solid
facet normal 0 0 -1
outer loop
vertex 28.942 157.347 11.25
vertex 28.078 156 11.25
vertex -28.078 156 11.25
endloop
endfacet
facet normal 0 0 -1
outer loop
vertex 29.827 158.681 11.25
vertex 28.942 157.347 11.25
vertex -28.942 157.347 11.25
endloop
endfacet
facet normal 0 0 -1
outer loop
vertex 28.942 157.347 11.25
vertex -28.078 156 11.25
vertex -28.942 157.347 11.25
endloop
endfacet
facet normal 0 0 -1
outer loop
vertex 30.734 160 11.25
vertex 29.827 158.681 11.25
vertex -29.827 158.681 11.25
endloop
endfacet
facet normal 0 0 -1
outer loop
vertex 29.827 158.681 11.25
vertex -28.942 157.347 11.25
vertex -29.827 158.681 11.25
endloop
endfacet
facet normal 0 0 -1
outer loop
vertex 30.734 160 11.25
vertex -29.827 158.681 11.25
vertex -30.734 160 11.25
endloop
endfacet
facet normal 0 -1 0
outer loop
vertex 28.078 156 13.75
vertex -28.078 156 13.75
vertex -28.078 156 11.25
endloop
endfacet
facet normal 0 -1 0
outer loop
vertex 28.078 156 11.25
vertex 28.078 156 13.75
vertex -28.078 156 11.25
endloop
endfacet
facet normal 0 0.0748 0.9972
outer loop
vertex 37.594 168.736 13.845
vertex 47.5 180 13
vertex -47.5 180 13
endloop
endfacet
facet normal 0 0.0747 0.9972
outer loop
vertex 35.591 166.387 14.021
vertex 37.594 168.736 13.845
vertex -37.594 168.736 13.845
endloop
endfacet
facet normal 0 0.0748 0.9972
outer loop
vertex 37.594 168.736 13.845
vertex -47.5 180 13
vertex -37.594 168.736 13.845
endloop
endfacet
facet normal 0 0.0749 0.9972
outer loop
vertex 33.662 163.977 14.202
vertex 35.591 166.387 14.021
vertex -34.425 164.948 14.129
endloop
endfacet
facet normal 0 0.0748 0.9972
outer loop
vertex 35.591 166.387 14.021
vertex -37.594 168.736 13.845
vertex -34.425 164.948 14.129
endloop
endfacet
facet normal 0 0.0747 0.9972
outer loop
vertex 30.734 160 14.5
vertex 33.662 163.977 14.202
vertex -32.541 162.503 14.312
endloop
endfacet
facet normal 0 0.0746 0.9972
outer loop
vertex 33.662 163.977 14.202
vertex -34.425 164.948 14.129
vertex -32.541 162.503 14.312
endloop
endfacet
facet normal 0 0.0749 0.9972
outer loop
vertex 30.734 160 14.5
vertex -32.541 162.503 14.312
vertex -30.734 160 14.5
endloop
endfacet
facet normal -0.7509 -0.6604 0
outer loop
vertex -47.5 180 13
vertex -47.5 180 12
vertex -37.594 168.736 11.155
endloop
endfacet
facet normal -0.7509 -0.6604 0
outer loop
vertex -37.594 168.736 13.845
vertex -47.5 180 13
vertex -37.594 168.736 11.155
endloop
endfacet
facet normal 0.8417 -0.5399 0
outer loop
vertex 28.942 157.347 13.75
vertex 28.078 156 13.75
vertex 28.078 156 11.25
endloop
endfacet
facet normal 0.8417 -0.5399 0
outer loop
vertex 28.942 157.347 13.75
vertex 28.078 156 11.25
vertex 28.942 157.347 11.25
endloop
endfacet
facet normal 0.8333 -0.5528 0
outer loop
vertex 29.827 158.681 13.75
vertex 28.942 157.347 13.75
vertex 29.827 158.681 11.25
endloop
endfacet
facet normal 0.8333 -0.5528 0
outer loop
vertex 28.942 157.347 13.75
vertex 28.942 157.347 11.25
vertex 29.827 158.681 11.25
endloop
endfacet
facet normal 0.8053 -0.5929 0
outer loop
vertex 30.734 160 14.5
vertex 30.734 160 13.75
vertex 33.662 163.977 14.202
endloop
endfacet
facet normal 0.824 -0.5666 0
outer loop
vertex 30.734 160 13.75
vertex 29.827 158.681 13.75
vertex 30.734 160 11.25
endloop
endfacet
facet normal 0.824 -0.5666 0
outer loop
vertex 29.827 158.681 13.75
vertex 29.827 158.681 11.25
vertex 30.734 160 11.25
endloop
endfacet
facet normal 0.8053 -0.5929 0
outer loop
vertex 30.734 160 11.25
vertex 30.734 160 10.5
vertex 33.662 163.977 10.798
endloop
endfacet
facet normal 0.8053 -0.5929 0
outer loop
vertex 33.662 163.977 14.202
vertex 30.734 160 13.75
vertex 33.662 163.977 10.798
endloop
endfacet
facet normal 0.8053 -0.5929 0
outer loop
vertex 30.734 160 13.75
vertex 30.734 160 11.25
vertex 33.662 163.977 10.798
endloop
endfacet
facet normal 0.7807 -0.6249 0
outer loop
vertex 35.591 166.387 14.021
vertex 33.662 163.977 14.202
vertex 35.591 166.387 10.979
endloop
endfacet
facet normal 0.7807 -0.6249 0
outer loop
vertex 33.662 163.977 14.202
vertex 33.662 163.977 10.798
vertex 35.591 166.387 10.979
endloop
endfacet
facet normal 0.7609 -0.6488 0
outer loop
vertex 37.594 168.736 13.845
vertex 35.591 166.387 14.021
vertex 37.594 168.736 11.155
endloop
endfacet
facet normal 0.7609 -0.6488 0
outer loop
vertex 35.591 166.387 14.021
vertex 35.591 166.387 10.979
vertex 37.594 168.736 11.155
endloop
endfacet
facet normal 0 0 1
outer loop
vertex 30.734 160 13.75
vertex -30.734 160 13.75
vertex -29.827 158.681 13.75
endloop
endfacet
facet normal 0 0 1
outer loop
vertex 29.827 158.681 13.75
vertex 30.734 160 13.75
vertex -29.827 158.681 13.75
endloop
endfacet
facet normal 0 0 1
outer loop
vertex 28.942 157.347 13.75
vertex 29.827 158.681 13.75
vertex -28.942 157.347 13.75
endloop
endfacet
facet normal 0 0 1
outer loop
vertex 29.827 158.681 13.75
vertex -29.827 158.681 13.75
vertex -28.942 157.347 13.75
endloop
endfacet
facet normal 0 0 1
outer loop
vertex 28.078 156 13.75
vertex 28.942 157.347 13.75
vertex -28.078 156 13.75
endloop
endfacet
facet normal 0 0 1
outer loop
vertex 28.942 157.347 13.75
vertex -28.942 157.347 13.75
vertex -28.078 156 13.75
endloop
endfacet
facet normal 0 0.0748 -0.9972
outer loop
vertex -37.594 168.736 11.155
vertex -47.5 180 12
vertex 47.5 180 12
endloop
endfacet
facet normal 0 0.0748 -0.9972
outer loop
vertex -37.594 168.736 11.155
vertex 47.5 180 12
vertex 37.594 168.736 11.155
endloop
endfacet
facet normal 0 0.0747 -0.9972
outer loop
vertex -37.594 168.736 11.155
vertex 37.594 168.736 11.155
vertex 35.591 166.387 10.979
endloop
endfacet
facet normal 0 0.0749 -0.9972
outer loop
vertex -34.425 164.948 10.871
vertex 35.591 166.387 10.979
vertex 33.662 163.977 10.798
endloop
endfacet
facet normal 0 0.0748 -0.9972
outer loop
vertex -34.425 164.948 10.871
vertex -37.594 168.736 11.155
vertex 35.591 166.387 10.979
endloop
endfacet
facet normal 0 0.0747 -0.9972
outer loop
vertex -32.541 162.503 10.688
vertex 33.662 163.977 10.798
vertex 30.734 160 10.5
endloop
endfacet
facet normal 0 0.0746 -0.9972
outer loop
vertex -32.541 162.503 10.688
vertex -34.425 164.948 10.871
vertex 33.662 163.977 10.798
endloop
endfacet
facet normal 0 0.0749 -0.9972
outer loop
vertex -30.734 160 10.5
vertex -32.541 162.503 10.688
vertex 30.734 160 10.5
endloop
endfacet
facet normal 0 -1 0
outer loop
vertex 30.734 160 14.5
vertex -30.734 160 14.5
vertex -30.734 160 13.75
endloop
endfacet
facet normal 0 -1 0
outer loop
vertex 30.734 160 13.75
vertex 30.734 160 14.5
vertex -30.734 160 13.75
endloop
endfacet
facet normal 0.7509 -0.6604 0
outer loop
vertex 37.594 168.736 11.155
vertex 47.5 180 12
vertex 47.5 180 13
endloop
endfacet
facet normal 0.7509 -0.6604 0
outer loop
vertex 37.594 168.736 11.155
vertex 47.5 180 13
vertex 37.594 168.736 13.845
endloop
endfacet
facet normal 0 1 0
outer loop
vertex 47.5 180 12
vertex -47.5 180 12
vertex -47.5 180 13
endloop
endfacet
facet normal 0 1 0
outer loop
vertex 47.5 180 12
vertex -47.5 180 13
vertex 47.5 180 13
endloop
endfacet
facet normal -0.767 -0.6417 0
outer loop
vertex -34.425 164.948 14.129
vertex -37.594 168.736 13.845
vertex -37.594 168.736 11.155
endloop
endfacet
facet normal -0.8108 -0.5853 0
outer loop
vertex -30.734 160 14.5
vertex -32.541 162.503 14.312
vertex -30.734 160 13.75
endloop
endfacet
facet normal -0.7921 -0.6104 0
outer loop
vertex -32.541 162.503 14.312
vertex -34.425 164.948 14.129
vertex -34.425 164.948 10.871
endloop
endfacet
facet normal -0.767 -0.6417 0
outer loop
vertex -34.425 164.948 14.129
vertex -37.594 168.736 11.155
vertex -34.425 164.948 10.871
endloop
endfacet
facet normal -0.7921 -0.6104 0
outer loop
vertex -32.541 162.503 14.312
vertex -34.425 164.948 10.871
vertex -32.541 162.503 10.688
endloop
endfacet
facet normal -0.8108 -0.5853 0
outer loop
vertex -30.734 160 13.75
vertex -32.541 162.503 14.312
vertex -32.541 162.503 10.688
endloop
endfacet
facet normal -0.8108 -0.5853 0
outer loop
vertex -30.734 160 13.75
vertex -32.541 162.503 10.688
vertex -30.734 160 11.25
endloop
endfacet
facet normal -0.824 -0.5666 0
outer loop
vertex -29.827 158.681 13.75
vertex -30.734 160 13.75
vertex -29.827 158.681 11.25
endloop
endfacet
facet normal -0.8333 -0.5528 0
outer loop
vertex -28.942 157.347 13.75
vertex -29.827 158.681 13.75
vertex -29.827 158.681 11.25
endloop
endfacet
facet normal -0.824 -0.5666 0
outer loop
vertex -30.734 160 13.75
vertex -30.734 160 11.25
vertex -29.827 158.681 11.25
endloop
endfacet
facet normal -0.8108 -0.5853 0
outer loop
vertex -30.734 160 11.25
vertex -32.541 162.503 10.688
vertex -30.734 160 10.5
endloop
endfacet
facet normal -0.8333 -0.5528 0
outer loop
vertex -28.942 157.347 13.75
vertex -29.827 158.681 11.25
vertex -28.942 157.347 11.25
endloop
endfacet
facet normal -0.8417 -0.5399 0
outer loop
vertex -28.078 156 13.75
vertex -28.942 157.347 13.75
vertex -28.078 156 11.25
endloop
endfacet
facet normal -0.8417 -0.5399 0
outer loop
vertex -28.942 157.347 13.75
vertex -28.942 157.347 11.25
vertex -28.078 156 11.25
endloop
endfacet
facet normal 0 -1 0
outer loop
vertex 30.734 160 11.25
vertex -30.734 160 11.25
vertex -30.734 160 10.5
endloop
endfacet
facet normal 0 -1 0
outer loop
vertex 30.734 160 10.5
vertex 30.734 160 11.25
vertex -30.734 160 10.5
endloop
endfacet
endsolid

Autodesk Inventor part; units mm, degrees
ref_plane "YZ Plane" through (0, 0, 0) normal (1, 0, 0) x (0, 1, 0)
ref_plane "XZ Plane" through (0, 0, 0) normal (0, 1, 0) x (-1, 0, 0)
ref_plane "XY Plane" through (0, 0, 0) normal (0, 0, 1) x (1, 0, 0)
sketch "Эскиз1" plane through (0, 0, 0) normal (0, 0, 1) x (1, 0, 0)
  line L0 (-13, 0) -> (13, 0)
  line L1 (-47.5, 180) -> (47.5, 180)
  line L2 (-16.5, 130) -> (16.5, 130)
  line L3 (-12.9827, 110) -> (12.9827, 110)
  line L4 (-11.8003, 90) -> (11.8003, 90)
  line L5 (47.5, 180) -> (37.594, 168.7363)
  line L6 (-47.5, 180) -> (-37.594, 168.7363)
  line L7 (-37.594, 168.7363) -> (37.594, 168.7363)
  arc A0 (37.594, 168.7363) -> (12.9827, 110) centre (112.573, 102.7948) ccw
  arc A1 (12.9827, 110) -> (13, 0) centre (771.5375, 55.1194) ccw
  arc A2 (-12.9827, 110) -> (-37.594, 168.7363) centre (-112.573, 102.7948) ccw
  arc A3 (-13, 0) -> (-12.9827, 110) centre (-771.5375, 55.1194) ccw
  line L8 (-11, 80.4723) -> (-11, 26.1046)
  line L9 (11, 80.4723) -> (11, 26.1046)
  line L10 (-37.594, 168.7363) -> (13.0707, 111.1279)
  line L11 (37.594, 168.7363) -> (-13.0707, 111.1279)
  point P0 (0, 0)
  point P1 (0, 0)
  point P2 (0, 180)
  point P3 (0, 130)
  point P4 (0, 90)
  point P5 (0, 110)
  point P6 (-11, 55.1194)
  dimension "d0" = 26
  dimension "d1" = 95
  dimension "d2" = 33
  dimension "d5" = 180
  dimension "d6" = 50
  dimension "d7" = 20
  dimension "d8" = 20
  dimension "d9" = 15
  dimension "d10" = 15
  dimension "d13" = 22
  dimension "d19" = 55.1194
extrude "Выдавливание1" add sketch "Эскиз1" along normal blind 25
sketch "Эскиз2" plane through (0, 0, 0) normal (1, 0, 0) x (0, 1, 0)
  line L0 (0, 0) -> (110, 0) projected
  line L1 (110, 0) -> (110, 25) projected
  line L2 (0, 25) -> (110, 25) projected
  line L3 (0, 0) -> (0, 25) projected
  line L4 (110, 0) -> (169.3956, 0) projected
  line L5 (110, 25) -> (169.3956, 25) projected
  line L6 (110, 0) -> (110, 25) projected
  line L7 (130, 18) -> (130, 7)
  line L8 (55, 21) -> (55, 4)
  arc A0 (0, 25) -> (130, 18) centre (172.2556, 2013.3889) ccw
  arc A1 (130, 7) -> (0, 0) centre (172.2556, -1988.3889) ccw
  line L9 (180, 13) -> (180, 12)
  line L10 (160, 14.5) -> (160, 10.5)
  line L11 (180, 13) -> (160, 14.5)
  line L12 (180, 12) -> (160, 10.5)
  arc A2 (130, 18) -> (160, 14.5) centre (187.3675, 379.4) ccw
  arc A3 (160, 10.5) -> (130, 7) centre (187.3675, -354.4) ccw
  line L13 (168.7363, 0) -> (180, 0) projected
  line L14 (180, 0) -> (180, 25) projected
  line L15 (168.7363, 25) -> (180, 25) projected
  line L16 (160, 13.75) -> (156, 13.75)
  line L17 (156, 13.75) -> (156, 11.25)
  line L18 (156, 11.25) -> (160, 11.25)
  point P0 (130, 12.5)
  point P1 (0, 12.5)
  point P2 (55, 12.5)
  point P3 (180, 12.5)
  point P4 (169.3956, 12.5)
  point P5 (160, 12.5)
  point P6 (180, 12.5)
  point P7 (156, 12.5)
  dimension "d16" = 11
  dimension "d20" = 55
  dimension "d21" = 17
  dimension "d22" = 1
  dimension "d23" = 4
  dimension "d28" = 50
  dimension "d30" = 20
  dimension "d33" = 4
  dimension "d34" = 2.5
extrude "Выдавливание2" cut sketch "Эскиз2" along normal mid plane 100 contours L10 L11 L9 L12 | L18 L17 L16 L10 keep common part
properties part number "bachi_v2" material "Фарфор, слоновая кость"
